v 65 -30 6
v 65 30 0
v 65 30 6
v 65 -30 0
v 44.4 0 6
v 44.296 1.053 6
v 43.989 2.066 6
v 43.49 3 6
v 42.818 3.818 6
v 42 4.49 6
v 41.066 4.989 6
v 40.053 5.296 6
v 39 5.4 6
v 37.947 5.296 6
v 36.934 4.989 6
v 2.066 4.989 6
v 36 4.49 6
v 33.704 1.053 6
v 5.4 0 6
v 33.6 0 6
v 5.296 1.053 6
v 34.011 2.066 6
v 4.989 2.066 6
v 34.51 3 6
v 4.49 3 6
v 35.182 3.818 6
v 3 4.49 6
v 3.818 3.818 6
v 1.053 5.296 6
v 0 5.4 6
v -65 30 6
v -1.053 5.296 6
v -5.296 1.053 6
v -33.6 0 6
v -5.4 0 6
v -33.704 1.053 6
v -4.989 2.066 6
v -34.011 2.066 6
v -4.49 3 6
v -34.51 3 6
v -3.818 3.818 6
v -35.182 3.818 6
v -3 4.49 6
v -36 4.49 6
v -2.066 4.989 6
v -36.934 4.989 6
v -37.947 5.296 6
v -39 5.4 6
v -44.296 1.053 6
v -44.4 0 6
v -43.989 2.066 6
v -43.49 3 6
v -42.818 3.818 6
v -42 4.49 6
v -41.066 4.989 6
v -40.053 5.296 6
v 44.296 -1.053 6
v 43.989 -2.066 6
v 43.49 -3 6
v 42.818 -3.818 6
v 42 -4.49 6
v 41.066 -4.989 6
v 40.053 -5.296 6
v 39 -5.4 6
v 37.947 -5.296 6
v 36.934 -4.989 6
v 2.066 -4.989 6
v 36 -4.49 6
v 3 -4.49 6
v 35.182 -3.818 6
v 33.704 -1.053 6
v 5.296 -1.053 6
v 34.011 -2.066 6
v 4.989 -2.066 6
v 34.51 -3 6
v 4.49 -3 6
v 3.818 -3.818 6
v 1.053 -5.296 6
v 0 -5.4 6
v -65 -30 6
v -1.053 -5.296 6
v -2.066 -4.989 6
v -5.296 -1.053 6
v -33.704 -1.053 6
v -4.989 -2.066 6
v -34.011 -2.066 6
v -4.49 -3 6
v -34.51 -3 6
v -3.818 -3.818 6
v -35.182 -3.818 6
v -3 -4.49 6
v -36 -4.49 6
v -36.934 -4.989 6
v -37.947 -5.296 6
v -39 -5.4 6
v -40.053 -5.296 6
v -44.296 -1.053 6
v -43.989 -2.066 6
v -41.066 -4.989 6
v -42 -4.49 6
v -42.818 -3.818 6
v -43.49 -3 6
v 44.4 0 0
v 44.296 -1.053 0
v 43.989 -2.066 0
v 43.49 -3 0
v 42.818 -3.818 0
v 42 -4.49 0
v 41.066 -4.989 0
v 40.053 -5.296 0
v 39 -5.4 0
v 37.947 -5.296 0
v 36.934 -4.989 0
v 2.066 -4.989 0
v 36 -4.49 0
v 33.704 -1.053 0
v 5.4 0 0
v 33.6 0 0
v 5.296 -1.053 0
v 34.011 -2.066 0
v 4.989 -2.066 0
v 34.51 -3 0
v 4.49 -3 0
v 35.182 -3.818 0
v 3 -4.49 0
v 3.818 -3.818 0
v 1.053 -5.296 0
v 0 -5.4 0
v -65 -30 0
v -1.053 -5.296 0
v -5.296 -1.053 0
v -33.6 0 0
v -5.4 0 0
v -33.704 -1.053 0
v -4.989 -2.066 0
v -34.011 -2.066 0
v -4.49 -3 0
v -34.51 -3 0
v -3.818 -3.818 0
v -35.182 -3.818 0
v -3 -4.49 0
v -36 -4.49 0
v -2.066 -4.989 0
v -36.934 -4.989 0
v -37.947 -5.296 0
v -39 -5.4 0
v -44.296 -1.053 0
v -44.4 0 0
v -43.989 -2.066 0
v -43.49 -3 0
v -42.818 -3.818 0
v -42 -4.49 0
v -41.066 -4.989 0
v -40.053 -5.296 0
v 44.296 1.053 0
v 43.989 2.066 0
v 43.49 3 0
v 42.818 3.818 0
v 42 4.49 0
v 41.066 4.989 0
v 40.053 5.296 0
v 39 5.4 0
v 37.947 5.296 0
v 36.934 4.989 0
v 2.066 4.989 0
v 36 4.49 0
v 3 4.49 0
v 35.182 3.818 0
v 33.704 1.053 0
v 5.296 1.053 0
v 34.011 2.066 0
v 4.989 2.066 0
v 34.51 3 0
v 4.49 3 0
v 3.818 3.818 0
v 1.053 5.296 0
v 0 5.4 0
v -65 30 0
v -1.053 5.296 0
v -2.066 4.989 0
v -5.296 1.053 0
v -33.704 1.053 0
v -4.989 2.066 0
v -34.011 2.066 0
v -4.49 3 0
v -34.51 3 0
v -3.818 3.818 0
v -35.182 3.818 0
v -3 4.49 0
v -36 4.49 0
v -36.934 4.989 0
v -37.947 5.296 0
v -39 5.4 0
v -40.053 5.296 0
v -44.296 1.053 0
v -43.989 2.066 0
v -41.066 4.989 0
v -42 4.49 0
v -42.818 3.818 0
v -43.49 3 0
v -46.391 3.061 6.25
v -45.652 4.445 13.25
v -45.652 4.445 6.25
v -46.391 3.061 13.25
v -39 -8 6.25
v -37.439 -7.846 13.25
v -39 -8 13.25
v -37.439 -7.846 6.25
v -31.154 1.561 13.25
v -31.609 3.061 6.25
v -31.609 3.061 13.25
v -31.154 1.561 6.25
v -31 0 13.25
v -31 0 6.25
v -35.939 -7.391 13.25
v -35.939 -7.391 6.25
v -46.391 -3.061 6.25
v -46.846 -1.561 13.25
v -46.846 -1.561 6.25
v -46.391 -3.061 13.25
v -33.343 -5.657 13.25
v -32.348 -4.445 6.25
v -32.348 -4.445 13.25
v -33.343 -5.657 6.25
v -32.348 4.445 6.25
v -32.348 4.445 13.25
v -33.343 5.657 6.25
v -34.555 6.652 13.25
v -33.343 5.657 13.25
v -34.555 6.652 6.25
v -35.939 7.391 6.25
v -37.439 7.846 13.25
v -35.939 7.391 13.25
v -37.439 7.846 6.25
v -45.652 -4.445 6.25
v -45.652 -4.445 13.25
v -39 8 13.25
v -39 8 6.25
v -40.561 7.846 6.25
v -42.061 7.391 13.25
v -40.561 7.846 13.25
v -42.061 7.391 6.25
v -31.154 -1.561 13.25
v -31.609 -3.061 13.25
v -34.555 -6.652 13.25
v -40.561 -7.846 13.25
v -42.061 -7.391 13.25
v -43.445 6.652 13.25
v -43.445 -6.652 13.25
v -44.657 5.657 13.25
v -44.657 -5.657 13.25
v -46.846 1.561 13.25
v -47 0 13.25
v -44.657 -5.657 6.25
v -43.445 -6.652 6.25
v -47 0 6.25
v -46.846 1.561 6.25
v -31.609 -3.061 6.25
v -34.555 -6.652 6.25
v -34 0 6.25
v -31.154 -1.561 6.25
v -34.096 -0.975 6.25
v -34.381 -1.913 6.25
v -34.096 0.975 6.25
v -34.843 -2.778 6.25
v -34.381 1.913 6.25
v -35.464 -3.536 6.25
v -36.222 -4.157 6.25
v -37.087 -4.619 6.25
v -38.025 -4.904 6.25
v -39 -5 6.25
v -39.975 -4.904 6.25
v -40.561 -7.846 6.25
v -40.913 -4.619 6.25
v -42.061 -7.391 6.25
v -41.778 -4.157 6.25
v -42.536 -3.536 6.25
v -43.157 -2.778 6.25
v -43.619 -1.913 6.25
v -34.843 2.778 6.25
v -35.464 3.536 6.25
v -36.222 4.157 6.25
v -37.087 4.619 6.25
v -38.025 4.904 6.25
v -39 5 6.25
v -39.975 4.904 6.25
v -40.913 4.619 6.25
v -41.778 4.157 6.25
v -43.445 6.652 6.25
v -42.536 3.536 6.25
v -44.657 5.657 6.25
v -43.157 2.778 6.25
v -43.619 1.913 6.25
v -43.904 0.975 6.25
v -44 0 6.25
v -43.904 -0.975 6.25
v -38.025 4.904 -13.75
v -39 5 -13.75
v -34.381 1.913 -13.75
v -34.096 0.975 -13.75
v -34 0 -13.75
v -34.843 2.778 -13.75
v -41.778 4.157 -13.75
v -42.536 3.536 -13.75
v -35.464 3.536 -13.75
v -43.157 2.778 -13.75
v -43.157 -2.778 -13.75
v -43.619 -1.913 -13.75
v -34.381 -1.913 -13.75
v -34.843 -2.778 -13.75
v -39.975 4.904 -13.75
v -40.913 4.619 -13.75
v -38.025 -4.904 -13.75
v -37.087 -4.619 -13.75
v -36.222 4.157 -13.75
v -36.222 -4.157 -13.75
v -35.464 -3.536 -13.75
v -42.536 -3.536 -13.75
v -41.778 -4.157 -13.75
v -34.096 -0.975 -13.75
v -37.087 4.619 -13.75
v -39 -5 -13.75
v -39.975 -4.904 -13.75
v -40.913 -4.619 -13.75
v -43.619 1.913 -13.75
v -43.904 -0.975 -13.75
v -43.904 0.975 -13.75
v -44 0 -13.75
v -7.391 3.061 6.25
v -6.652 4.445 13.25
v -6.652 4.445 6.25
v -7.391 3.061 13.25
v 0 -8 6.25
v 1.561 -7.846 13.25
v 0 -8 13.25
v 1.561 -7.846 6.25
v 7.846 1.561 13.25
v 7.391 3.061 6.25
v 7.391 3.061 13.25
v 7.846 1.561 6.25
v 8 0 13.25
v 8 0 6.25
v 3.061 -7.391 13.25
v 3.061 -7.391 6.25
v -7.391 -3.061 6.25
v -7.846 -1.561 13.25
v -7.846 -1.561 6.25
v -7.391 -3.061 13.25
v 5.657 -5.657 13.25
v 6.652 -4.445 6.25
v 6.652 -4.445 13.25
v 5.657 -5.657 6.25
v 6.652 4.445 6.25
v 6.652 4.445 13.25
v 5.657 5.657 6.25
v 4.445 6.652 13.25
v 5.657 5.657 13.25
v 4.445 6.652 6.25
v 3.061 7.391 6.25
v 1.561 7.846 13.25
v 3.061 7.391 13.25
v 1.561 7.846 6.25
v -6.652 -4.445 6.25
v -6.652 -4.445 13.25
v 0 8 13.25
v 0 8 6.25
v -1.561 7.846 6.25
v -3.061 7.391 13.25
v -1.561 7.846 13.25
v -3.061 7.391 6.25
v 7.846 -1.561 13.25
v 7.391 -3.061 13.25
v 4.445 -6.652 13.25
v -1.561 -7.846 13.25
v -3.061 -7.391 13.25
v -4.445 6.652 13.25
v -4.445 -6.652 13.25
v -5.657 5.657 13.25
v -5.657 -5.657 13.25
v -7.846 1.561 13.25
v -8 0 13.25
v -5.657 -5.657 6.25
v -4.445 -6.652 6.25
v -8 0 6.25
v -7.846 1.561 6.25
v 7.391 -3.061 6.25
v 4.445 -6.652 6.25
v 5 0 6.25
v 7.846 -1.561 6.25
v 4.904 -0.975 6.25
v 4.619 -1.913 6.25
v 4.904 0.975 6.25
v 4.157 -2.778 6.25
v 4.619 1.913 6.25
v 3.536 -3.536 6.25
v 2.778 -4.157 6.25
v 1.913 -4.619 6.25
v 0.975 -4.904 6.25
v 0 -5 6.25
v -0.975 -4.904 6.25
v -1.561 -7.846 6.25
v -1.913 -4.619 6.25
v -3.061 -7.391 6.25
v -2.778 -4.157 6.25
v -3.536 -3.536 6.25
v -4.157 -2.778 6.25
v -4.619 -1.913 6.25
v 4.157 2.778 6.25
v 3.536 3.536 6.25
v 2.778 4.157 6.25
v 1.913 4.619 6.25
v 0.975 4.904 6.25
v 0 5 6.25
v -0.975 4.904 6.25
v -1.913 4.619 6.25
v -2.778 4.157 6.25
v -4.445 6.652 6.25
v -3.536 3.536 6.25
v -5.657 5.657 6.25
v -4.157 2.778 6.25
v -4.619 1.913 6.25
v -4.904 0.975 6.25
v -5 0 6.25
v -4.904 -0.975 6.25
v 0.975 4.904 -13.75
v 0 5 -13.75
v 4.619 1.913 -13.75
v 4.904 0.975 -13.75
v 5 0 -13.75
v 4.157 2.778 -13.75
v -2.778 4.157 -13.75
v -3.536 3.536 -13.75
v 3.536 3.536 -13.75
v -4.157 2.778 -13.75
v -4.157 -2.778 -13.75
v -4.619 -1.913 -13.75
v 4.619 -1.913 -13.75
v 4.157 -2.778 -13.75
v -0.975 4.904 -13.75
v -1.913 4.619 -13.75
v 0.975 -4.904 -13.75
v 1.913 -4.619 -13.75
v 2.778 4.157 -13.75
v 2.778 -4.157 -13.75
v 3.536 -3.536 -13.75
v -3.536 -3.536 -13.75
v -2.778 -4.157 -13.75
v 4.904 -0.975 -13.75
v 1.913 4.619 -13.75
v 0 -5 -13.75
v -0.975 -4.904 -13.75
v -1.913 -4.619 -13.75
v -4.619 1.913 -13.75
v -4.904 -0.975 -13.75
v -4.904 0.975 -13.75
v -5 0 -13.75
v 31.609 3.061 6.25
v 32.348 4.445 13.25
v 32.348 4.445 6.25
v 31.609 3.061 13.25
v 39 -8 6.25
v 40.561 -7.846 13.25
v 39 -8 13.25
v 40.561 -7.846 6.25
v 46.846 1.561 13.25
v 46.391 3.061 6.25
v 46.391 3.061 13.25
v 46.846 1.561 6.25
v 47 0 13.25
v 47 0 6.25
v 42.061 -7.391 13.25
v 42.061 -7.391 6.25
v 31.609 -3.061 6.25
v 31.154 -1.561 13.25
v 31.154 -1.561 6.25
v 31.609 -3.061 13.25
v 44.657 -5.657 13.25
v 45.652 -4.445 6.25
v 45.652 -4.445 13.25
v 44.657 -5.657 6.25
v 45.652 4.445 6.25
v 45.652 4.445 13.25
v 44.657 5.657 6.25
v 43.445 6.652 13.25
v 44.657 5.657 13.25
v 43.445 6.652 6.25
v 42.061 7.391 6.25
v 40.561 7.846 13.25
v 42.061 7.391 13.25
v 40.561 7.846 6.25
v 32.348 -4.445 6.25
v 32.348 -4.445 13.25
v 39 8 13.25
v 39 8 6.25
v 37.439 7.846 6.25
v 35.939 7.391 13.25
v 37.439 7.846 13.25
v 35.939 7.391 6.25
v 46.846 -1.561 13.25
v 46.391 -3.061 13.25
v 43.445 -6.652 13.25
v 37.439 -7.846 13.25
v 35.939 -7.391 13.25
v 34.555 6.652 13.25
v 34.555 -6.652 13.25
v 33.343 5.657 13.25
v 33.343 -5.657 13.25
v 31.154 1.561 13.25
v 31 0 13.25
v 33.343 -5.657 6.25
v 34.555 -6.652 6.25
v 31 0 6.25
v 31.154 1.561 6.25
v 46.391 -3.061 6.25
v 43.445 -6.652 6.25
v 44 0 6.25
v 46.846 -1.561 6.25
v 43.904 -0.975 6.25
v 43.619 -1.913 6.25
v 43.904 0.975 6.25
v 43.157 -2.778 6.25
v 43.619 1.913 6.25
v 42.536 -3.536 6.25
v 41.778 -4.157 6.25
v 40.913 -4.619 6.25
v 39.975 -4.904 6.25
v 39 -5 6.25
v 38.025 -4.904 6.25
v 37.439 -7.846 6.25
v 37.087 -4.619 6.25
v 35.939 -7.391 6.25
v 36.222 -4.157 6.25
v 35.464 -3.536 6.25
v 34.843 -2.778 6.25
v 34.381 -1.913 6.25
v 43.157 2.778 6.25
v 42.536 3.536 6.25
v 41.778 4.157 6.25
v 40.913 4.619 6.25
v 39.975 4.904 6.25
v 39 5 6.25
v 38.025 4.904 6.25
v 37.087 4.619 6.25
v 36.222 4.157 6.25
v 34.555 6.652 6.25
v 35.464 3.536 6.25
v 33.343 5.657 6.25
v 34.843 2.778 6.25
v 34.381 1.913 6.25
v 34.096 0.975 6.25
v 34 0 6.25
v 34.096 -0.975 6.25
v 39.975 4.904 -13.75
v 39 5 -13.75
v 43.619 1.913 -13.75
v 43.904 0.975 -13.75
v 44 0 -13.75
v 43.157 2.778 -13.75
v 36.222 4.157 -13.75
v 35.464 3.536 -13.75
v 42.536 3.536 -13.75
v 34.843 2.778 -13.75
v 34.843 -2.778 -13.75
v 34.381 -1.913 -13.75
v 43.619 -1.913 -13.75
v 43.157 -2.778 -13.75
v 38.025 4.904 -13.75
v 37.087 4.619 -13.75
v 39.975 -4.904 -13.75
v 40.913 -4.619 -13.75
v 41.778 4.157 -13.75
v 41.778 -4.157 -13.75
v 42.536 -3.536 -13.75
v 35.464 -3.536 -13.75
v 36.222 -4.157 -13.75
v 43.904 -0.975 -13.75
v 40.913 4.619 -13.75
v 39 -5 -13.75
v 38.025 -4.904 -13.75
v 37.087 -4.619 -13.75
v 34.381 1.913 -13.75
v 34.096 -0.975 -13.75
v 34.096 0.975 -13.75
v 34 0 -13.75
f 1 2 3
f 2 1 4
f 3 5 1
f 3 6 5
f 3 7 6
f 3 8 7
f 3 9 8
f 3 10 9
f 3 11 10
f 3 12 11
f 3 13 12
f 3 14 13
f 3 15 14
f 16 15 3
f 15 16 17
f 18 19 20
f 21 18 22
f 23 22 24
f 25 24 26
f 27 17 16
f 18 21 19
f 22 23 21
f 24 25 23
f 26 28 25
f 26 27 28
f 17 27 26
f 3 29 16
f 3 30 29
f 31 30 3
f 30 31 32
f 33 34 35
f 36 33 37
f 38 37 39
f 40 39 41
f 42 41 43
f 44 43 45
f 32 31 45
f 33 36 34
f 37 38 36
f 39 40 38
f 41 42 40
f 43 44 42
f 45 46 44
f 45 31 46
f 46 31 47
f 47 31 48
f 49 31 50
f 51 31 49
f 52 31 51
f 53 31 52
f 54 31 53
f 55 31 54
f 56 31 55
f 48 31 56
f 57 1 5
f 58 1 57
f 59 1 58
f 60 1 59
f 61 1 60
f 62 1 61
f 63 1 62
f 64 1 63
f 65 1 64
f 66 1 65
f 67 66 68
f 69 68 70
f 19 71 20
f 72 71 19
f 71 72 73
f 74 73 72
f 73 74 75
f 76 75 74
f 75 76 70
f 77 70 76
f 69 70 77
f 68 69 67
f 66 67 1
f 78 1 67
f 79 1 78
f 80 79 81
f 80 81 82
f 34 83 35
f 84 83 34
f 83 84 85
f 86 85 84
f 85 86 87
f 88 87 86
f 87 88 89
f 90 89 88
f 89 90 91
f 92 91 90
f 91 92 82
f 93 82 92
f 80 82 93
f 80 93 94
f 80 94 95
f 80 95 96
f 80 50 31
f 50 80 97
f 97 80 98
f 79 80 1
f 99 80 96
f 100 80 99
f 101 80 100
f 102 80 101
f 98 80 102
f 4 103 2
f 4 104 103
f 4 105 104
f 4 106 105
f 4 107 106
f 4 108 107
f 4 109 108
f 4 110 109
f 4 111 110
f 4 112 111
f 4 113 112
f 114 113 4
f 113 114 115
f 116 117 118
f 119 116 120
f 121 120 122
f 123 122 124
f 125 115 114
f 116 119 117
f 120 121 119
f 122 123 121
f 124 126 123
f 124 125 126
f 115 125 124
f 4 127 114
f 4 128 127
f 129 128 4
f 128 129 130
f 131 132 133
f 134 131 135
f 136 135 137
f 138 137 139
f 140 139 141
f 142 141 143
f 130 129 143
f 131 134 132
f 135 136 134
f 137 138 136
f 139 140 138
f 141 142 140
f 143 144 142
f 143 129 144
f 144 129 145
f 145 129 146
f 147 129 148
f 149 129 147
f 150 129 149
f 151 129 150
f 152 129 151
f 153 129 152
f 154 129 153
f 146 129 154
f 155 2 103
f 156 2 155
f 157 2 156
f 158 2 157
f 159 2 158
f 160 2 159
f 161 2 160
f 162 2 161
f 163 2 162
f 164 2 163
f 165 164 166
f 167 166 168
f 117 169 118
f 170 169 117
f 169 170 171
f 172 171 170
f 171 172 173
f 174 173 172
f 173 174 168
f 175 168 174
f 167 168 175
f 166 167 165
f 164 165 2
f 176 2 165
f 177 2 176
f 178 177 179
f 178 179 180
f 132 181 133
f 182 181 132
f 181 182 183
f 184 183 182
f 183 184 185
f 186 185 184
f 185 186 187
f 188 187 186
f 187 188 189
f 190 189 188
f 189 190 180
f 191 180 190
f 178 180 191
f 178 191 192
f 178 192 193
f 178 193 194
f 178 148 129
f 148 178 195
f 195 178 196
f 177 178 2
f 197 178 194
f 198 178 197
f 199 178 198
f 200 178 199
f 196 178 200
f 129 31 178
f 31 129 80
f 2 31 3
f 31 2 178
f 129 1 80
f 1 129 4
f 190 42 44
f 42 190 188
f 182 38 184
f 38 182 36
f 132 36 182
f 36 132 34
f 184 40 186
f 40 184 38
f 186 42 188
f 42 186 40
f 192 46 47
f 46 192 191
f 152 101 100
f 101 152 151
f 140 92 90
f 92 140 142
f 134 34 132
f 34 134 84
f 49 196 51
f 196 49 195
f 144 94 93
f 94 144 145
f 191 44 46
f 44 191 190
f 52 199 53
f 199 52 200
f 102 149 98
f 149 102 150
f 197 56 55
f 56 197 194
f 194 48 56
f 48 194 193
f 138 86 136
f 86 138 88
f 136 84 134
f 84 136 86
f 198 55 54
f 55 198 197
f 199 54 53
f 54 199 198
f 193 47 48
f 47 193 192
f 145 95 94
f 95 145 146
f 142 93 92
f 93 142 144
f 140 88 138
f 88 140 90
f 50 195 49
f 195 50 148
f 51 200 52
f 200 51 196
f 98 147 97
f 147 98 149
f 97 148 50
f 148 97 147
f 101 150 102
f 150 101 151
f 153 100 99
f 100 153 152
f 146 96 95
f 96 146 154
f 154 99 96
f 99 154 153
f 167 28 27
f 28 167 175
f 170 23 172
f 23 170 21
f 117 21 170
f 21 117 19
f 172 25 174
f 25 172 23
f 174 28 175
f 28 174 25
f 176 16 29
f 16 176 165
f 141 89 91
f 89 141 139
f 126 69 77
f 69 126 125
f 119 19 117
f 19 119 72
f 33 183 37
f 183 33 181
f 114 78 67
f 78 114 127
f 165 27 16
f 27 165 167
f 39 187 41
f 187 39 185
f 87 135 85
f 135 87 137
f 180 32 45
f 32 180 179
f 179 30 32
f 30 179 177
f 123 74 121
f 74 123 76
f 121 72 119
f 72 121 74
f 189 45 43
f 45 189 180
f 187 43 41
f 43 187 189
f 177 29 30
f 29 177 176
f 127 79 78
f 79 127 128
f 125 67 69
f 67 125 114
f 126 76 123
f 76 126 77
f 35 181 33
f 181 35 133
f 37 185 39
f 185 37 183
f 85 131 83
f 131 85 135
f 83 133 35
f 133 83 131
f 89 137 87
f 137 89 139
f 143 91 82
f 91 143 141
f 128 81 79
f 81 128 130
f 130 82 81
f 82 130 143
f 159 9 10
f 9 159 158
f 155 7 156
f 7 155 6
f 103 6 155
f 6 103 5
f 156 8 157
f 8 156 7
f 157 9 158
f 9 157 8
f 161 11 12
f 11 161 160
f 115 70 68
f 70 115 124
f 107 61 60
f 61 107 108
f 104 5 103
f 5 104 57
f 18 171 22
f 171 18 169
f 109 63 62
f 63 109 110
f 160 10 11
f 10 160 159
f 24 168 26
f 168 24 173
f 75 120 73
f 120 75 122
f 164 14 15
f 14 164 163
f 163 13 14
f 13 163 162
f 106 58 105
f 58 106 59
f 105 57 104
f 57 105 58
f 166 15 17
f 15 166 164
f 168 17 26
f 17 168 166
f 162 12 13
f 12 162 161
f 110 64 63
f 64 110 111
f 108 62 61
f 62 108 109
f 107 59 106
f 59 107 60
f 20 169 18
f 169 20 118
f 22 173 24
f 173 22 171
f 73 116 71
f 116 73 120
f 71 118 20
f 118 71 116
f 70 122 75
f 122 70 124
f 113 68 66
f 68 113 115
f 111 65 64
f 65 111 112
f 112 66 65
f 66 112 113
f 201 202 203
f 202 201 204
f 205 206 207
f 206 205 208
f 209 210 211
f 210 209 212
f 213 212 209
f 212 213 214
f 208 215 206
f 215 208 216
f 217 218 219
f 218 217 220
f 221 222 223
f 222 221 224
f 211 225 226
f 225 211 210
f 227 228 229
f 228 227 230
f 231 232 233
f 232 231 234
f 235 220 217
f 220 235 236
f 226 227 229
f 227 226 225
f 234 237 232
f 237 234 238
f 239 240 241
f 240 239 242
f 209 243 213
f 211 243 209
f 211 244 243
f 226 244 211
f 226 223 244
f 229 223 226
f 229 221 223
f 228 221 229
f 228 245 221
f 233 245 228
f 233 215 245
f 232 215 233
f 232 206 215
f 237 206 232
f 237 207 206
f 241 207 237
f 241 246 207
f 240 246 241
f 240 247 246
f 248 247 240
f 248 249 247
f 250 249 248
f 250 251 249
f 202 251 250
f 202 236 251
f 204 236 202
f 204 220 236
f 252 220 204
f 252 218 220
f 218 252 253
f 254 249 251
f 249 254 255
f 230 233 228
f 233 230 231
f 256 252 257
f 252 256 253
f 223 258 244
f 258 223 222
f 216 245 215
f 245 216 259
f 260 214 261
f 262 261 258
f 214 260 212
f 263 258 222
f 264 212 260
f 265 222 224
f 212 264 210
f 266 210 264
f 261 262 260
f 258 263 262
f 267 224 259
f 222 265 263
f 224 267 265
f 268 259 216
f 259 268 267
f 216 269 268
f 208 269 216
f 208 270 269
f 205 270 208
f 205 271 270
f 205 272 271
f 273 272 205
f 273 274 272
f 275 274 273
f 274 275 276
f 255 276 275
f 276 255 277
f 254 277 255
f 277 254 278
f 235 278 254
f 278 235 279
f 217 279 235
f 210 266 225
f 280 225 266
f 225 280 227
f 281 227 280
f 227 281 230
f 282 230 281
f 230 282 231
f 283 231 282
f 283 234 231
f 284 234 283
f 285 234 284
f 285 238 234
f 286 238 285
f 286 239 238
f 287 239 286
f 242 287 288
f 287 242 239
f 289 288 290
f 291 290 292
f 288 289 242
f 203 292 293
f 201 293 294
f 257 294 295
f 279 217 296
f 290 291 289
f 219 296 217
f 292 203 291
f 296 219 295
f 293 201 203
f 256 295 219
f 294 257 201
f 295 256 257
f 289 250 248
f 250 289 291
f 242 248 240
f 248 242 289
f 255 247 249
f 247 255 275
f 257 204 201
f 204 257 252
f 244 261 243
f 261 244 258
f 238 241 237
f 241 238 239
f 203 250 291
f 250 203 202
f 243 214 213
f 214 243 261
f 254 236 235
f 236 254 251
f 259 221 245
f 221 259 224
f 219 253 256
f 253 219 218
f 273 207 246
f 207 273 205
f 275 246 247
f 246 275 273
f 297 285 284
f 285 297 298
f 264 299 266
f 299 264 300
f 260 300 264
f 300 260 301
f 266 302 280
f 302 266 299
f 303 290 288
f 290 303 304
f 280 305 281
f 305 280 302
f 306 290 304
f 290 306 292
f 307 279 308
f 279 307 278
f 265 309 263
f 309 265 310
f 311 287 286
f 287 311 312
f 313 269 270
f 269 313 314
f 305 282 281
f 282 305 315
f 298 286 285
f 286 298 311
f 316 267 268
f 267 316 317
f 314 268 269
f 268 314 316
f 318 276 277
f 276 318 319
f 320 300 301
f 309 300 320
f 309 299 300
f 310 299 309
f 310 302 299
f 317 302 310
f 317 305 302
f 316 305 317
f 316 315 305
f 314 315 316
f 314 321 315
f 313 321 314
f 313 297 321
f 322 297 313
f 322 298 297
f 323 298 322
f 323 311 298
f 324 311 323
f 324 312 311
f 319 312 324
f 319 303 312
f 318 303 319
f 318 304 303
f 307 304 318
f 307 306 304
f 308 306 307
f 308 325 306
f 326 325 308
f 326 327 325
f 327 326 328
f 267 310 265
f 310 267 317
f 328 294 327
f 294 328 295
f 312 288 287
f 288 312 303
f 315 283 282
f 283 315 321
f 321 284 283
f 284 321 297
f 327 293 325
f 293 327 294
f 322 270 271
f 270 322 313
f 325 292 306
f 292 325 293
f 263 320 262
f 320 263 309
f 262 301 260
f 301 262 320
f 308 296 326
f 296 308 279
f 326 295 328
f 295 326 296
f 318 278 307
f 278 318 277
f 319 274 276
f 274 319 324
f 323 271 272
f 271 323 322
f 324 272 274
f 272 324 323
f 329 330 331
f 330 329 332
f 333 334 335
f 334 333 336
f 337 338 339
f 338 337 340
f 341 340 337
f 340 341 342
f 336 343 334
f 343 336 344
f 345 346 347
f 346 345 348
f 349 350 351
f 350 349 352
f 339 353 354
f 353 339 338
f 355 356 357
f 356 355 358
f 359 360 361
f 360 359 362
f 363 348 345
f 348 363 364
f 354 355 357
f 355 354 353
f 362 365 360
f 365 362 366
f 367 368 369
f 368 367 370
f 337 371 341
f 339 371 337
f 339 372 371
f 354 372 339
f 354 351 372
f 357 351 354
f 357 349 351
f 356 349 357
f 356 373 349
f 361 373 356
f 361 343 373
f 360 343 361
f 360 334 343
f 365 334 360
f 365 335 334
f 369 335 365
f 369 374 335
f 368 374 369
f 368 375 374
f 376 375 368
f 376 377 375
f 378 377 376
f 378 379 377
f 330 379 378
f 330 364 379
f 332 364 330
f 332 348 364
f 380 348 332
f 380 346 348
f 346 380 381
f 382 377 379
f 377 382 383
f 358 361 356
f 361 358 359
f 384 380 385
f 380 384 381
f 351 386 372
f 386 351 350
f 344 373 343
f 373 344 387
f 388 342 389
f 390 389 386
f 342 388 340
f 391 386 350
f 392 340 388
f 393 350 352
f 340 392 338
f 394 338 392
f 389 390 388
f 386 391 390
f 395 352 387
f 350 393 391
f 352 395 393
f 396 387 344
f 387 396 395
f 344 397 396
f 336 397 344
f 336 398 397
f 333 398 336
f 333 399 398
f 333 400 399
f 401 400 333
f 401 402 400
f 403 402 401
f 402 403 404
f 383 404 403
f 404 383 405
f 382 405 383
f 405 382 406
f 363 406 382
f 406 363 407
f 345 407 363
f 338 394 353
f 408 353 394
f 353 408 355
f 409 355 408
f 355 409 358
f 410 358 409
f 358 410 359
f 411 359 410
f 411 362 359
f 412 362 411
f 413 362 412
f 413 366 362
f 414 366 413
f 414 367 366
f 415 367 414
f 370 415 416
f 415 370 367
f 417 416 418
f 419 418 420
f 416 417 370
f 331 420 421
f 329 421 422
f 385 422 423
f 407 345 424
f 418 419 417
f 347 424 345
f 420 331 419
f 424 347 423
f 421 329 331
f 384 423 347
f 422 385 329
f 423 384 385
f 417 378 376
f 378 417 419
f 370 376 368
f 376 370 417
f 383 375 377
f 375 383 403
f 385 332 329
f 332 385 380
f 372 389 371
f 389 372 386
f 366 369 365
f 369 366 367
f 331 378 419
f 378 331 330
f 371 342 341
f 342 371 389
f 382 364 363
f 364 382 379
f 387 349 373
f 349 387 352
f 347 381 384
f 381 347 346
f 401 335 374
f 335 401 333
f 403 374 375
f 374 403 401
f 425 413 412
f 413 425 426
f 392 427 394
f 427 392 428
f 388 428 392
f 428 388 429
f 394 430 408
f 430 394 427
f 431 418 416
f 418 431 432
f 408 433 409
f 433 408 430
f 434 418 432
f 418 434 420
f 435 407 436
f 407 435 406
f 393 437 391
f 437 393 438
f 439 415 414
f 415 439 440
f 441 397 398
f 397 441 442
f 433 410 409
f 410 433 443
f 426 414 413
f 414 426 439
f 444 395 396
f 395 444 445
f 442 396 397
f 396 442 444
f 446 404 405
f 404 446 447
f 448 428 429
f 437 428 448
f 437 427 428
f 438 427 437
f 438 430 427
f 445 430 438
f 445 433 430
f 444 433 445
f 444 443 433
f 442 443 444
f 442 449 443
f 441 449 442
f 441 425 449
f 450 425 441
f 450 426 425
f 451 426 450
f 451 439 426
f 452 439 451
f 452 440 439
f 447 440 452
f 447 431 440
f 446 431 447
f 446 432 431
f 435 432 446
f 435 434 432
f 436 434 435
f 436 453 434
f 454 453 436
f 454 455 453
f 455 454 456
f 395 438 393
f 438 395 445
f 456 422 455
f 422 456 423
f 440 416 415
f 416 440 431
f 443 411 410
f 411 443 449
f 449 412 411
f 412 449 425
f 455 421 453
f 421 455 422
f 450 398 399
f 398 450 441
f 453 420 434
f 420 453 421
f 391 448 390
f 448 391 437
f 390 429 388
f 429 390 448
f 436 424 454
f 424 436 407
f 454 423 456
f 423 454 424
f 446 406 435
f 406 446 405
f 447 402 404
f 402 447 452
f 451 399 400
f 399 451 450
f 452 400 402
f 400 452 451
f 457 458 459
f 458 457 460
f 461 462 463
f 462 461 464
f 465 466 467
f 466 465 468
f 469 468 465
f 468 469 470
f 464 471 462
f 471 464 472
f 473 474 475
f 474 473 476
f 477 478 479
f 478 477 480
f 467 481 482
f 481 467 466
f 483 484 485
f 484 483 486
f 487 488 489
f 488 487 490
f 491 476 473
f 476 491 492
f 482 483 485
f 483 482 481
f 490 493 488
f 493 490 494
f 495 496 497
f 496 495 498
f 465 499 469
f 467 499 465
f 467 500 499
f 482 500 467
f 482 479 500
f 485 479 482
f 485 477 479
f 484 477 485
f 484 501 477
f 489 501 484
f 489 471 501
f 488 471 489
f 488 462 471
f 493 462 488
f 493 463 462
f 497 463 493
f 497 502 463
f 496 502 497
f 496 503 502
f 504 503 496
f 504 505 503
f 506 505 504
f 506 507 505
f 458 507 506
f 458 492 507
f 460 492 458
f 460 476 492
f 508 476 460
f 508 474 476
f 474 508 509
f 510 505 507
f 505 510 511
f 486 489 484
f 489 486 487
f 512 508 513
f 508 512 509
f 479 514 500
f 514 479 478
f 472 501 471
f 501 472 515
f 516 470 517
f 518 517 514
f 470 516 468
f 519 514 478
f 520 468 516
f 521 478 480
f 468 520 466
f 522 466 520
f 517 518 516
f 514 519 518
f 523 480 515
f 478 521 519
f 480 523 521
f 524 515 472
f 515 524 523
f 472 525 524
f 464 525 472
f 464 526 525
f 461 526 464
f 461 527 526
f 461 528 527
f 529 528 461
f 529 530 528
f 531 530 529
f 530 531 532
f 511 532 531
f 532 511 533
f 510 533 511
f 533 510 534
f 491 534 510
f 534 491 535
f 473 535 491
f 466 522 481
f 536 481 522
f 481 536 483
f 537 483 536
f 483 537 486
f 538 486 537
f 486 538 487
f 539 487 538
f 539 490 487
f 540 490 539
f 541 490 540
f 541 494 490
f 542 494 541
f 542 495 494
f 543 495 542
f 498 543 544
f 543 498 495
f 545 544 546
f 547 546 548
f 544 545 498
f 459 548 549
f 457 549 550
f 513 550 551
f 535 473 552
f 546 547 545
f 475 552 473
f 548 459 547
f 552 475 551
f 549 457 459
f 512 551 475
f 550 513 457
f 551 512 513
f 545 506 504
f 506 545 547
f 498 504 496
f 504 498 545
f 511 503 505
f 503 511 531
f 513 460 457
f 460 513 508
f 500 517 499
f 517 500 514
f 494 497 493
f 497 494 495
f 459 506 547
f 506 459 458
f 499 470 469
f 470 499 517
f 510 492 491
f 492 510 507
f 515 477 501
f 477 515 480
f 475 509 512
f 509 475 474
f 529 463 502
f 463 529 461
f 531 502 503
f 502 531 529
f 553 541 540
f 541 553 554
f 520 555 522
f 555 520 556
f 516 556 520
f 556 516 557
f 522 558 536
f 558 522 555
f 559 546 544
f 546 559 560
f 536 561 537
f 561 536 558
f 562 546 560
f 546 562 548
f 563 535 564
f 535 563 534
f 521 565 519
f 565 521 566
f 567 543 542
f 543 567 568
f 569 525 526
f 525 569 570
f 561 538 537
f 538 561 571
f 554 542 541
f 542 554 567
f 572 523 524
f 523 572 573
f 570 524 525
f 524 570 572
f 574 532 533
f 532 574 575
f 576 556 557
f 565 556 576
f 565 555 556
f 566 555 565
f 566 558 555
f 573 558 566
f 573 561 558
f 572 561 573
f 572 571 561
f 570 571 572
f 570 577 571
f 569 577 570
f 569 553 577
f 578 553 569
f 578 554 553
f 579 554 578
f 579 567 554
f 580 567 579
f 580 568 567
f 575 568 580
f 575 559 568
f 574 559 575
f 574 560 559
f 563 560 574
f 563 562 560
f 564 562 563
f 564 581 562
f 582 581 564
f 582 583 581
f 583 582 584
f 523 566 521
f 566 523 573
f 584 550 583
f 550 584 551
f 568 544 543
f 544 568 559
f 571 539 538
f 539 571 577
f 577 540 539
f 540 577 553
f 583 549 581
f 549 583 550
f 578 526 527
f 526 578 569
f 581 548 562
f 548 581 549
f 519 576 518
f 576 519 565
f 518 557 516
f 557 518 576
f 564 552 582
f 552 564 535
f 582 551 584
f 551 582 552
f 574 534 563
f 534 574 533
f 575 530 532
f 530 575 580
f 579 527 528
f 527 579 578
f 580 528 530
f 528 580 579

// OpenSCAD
$fn = 32;

// ------------------------------------------------------------------------
// Bolted plate: 130 x 60 x 6 mm plate, 3 fasteners
// Every part is its own module, assembly() places them once.
// ------------------------------------------------------------------------

// --- part 1 ---
module plate() {
  difference() {
    translate([-65, -30, 0]) cube([130, 60, 6]);
    translate([-39, 0, -1]) cylinder(h = 8, d = 10.8);
    translate([0, 0, -1]) cylinder(h = 8, d = 10.8);
    translate([39, 0, -1]) cylinder(h = 8, d = 10.8);
  }
}

// --- part 2 ---
module bolt1() {
  cylinder(h = 7, d = 16);
  translate([0, 0, -20]) cylinder(h = 20, d = 10);
}

// --- part 3 ---
module bolt2() {
  cylinder(h = 7, d = 16);
  translate([0, 0, -20]) cylinder(h = 20, d = 10);
}

// --- part 4 ---
module bolt3() {
  cylinder(h = 7, d = 16);
  translate([0, 0, -20]) cylinder(h = 20, d = 10);
}

// --- assembly ---
module assembly() {
  translate([0, 0, 0]) rotate([0, 0, 0]) plate();
  translate([-39, 0, 6.25]) rotate([0, 0, 0]) bolt1();
  translate([0, 0, 6.25]) rotate([0, 0, 0]) bolt2();
  translate([39, 0, 6.25]) rotate([0, 0, 0]) bolt3();
}

assembly();
